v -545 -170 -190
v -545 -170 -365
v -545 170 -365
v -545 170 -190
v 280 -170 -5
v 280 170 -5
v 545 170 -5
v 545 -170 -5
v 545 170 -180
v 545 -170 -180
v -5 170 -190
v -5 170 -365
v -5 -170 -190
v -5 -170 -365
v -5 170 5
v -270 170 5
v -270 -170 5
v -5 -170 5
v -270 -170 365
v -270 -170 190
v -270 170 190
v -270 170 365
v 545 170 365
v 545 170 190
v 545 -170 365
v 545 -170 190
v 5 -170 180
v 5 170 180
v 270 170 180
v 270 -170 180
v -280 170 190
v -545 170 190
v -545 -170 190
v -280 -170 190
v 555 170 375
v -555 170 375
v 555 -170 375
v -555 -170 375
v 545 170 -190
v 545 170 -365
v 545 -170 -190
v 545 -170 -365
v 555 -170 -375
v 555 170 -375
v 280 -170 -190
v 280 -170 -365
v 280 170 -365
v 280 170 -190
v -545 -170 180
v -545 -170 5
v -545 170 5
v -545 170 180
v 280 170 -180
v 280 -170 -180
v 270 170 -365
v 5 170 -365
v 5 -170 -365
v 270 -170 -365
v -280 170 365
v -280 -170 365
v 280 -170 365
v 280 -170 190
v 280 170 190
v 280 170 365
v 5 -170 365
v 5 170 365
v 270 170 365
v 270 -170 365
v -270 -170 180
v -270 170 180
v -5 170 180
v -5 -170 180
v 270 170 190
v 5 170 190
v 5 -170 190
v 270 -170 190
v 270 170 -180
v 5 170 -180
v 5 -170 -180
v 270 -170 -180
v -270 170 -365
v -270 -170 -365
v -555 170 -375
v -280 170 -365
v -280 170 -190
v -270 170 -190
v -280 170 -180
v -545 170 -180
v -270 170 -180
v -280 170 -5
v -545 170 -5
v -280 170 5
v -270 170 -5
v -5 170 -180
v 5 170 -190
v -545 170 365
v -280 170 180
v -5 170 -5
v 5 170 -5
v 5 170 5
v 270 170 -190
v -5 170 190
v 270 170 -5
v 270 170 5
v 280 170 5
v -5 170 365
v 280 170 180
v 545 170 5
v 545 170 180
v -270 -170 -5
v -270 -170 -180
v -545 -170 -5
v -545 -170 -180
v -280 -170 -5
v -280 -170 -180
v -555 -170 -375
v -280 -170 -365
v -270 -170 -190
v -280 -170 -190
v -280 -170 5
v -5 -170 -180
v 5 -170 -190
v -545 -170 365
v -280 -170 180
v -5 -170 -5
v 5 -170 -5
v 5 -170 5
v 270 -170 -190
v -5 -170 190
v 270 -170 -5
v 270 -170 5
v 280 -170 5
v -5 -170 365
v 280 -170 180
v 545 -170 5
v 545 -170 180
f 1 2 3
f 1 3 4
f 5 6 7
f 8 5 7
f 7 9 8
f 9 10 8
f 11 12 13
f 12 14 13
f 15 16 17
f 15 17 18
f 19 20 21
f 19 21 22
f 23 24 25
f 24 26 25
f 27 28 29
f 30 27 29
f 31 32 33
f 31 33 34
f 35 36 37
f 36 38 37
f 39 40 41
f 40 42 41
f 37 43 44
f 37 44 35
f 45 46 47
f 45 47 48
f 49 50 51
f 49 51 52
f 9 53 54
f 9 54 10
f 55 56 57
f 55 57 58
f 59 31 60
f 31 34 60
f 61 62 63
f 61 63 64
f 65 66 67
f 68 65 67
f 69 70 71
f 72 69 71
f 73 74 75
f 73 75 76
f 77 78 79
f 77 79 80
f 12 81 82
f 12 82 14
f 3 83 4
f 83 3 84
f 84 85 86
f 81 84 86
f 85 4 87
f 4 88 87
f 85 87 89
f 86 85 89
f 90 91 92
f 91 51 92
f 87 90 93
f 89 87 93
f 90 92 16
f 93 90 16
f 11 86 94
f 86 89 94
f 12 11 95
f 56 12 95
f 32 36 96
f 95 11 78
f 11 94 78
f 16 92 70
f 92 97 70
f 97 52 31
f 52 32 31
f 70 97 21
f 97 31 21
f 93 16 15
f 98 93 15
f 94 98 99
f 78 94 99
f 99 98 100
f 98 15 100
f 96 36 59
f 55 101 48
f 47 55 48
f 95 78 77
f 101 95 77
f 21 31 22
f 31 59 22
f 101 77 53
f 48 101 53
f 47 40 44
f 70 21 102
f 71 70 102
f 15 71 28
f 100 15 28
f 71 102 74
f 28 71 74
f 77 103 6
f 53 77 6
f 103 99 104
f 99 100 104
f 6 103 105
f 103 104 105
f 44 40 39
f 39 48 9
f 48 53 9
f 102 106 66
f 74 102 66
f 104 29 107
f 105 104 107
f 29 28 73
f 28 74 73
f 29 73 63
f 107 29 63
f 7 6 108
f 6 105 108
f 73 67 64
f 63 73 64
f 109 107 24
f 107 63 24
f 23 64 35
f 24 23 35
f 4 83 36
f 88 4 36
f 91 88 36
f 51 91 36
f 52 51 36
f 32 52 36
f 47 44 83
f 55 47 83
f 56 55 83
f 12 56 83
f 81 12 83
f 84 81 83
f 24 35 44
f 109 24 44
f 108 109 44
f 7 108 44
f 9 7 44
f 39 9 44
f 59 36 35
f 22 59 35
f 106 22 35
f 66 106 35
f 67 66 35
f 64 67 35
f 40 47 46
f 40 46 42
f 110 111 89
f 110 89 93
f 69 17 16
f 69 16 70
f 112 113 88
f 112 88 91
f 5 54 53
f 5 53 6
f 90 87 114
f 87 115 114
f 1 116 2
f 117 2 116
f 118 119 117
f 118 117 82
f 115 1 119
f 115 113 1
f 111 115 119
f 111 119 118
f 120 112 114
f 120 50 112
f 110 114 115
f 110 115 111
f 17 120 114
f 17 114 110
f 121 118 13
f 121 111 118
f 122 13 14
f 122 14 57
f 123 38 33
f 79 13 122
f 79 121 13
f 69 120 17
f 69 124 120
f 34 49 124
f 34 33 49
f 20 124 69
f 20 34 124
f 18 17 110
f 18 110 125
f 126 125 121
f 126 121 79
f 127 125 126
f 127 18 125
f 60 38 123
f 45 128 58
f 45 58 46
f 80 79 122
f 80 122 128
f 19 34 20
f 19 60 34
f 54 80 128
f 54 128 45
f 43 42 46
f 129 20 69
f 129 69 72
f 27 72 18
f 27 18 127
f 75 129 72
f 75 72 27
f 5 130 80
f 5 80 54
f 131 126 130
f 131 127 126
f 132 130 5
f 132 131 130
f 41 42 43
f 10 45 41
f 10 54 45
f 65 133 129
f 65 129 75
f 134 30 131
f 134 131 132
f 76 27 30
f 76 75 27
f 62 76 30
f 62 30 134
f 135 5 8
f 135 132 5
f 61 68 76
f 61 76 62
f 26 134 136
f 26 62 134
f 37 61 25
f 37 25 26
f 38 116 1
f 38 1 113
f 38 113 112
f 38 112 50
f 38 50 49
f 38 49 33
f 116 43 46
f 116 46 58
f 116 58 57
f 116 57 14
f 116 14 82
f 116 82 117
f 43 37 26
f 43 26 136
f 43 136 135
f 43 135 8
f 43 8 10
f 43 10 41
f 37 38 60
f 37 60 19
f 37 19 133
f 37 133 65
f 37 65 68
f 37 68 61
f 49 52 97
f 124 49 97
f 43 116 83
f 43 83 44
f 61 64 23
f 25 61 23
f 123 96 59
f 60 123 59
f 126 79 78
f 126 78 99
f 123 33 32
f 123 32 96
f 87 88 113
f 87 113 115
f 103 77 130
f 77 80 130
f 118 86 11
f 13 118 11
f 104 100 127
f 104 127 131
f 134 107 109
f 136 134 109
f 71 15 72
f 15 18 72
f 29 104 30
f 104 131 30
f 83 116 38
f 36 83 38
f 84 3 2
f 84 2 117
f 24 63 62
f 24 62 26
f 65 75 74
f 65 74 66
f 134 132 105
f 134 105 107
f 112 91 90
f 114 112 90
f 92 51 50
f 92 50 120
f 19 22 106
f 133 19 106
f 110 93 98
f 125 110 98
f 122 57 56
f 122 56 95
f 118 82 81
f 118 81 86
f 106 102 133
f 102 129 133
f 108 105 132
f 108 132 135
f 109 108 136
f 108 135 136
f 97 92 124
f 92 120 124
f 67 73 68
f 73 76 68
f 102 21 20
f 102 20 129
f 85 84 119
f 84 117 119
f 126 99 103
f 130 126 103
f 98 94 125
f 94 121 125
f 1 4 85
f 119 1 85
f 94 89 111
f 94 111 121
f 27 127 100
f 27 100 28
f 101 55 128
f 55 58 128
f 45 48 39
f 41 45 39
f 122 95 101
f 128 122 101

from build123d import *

# Parameters (mm, degrees)
F0_W     = 1110
F0_H     = 750
F0_W_2   = 265
F0_H_2   = 175
F1_DEPTH = 170


with BuildPart() as f1:
    # F0 (on Front) → F1 (new body, symmetric)
    with BuildSketch(Plane.XZ):
        Rectangle(F0_W, F0_H)
        with Locations((-412.5, -277.5)):
            Rectangle(F0_W_2, F0_H_2, mode=Mode.SUBTRACT)
        with Locations((-137.5, -277.5)):
            Rectangle(F0_W_2, F0_H_2, mode=Mode.SUBTRACT)
        with Locations((-412.5, -92.5)):
            Rectangle(F0_W_2, F0_H_2, mode=Mode.SUBTRACT)
        with Locations((-137.5, -92.5)):
            Rectangle(F0_W_2, F0_H_2, mode=Mode.SUBTRACT)
        with Locations((137.5, -277.5)):
            Rectangle(F0_W_2, F0_H_2, mode=Mode.SUBTRACT)
        with Locations((412.5, -277.5)):
            Rectangle(F0_W_2, F0_H_2, mode=Mode.SUBTRACT)
        with Locations((137.5, -92.5)):
            Rectangle(F0_W_2, F0_H_2, mode=Mode.SUBTRACT)
        with Locations((412.5, -92.5)):
            Rectangle(F0_W_2, F0_H_2, mode=Mode.SUBTRACT)
        with Locations((-412.5, 92.5)):
            Rectangle(F0_W_2, F0_H_2, mode=Mode.SUBTRACT)
        with Locations((-137.5, 92.5)):
            Rectangle(F0_W_2, F0_H_2, mode=Mode.SUBTRACT)
        with Locations((-412.5, 277.5)):
            Rectangle(F0_W_2, F0_H_2, mode=Mode.SUBTRACT)
        with Locations((-137.5, 277.5)):
            Rectangle(F0_W_2, F0_H_2, mode=Mode.SUBTRACT)
        with Locations((137.5, 92.5)):
            Rectangle(F0_W_2, F0_H_2, mode=Mode.SUBTRACT)
        with Locations((412.5, 92.5)):
            Rectangle(F0_W_2, F0_H_2, mode=Mode.SUBTRACT)
        with Locations((137.5, 277.5)):
            Rectangle(F0_W_2, F0_H_2, mode=Mode.SUBTRACT)
        with Locations((412.5, 277.5)):
            Rectangle(F0_W_2, F0_H_2, mode=Mode.SUBTRACT)
    extrude(amount=F1_DEPTH, both=True)


solid = f1.part
